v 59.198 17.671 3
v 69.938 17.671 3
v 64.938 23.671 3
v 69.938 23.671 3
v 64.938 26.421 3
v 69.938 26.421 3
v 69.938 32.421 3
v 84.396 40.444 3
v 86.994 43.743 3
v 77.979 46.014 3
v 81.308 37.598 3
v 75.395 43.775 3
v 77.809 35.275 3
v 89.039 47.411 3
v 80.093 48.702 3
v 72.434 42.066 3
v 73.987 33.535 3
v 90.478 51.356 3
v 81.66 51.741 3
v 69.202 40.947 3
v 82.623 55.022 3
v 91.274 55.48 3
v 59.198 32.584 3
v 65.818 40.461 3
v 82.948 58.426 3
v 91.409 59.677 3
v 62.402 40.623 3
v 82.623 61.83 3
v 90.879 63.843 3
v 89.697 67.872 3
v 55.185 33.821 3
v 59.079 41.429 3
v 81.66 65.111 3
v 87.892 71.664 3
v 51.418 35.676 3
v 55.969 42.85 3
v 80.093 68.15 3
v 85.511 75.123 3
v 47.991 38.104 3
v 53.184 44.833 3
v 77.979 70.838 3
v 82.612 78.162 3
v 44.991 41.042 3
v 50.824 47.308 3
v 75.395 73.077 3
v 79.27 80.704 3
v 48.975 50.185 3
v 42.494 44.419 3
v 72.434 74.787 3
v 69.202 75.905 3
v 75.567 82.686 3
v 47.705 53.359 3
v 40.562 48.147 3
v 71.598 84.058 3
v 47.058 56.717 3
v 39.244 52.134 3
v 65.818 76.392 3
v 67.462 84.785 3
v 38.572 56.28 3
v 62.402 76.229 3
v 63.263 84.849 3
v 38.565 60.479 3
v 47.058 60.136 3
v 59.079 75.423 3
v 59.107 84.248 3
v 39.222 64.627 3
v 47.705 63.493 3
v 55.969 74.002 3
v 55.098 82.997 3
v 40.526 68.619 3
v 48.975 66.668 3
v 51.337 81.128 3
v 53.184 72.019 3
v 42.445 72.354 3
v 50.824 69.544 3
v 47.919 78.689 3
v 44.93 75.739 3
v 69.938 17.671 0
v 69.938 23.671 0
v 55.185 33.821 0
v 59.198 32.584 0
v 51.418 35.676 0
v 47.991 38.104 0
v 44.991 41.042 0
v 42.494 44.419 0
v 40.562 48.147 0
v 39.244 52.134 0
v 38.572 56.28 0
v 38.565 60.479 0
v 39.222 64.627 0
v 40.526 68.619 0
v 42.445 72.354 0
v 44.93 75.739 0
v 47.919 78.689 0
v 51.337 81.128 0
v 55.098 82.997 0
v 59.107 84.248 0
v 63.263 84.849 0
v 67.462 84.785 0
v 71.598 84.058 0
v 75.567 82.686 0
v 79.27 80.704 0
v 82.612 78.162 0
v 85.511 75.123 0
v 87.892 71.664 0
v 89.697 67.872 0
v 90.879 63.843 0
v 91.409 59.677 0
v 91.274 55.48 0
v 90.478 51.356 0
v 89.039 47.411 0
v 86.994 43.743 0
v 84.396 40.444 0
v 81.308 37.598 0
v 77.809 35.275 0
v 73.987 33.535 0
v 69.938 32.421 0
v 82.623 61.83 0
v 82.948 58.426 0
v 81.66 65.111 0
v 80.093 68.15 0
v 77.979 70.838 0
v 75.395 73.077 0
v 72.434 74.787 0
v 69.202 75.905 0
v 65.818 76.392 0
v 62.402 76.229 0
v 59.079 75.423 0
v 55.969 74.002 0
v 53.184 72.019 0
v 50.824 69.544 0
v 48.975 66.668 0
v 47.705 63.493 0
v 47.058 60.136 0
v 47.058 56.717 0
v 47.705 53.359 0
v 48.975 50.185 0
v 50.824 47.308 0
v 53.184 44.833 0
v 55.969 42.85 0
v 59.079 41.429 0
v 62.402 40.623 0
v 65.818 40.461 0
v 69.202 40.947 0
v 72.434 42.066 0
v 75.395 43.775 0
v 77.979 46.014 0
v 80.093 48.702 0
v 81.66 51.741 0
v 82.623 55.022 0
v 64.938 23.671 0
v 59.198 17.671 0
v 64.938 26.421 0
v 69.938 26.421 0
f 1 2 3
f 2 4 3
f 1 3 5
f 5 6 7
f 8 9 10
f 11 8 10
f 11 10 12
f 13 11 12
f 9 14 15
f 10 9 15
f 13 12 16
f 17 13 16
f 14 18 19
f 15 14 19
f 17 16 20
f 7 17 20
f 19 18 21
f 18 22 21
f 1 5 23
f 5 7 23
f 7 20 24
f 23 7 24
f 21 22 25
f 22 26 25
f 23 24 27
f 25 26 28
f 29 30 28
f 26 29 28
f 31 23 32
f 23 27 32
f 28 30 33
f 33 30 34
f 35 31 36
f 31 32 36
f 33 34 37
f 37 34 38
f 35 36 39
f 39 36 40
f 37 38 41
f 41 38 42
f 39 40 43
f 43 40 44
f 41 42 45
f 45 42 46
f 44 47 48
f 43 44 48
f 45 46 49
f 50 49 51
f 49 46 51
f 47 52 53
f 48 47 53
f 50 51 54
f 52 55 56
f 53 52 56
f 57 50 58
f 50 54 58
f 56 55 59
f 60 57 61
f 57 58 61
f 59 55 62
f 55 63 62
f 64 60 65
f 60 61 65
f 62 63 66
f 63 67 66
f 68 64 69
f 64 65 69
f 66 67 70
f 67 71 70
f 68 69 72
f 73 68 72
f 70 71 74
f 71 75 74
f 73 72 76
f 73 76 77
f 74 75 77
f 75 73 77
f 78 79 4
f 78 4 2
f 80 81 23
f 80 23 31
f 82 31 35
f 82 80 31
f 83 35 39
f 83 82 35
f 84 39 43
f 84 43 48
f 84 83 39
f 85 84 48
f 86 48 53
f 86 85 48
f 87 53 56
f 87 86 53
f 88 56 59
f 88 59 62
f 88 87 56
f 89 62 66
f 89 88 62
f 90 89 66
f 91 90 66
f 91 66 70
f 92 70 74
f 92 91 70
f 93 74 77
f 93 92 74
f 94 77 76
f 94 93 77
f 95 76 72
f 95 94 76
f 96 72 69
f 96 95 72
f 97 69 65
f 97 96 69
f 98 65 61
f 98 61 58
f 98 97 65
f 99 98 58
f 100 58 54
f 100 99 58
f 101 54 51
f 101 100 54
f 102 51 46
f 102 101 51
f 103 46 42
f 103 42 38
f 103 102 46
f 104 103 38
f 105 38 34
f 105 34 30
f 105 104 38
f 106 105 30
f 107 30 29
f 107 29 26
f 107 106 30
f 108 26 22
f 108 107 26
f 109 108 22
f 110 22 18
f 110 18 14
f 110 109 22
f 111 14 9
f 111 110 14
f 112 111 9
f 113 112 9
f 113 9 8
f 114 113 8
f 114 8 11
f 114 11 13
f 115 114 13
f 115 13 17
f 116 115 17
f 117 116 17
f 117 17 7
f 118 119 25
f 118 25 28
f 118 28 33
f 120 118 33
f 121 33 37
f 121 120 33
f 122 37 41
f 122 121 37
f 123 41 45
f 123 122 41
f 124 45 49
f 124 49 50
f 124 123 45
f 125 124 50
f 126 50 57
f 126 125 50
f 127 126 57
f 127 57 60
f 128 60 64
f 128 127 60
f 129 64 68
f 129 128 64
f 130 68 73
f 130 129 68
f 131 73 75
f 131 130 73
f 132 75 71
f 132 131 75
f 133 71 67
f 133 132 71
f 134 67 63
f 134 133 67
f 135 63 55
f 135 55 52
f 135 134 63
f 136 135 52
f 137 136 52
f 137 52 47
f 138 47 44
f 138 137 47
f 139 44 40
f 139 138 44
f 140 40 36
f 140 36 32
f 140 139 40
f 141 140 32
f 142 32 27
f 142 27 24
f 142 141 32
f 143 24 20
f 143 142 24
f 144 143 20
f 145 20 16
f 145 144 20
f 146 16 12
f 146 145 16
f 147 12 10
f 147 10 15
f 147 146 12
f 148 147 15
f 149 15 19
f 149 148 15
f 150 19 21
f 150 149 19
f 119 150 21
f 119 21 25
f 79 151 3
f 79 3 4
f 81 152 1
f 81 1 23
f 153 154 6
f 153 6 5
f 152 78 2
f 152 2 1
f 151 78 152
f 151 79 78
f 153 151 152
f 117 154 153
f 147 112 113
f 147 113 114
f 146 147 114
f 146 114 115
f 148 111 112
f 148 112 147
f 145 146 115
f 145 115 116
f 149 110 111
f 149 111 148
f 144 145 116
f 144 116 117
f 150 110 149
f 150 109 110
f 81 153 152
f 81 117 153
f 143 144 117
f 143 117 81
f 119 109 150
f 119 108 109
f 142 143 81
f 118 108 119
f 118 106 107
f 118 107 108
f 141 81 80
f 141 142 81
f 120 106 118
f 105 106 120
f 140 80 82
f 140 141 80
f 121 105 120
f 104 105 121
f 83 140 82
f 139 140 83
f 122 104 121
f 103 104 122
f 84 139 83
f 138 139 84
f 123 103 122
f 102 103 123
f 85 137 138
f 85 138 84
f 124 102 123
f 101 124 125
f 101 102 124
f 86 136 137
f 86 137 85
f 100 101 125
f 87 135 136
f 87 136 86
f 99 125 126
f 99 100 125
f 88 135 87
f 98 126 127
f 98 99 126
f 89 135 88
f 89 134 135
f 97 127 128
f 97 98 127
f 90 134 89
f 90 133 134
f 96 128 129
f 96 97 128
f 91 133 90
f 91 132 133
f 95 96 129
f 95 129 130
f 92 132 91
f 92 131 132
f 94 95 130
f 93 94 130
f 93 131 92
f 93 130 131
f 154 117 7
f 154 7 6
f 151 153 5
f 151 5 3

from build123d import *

# Parameters (mm, degrees)
CROQUIS1_R              = 17.985951022
SALIENTE_EXTRUIR1_DEPTH = 3


with BuildPart() as part:
    # Croquis1 → Saliente-Extruir1 (new body)
    with BuildSketch(Plane.XY):
        with BuildLine():
            Line((69.938444675, 17.671179984), (59.198401062, 17.671179984))
            Line((59.198401062, 17.671179984), (59.198401062, 32.584255723))
            ThreePointArc((59.198401062, 32.584255723), (65.364018559, 84.900042365), (69.938444675, 32.421179984))
            Line((69.938444675, 32.421179984), (69.938444675, 26.421179984))
            Line((69.938444675, 26.421179984), (64.938444675, 26.421179984))
            Line((64.938444675, 26.421179984), (64.938444675, 23.671179984))
            Line((64.938444675, 23.671179984), (69.938444675, 23.671179984))
            Line((69.938444675, 23.671179984), (69.938444675, 17.671179984))
        make_face()
        with Locations((64.962042446, 58.426202565)):
            Circle(CROQUIS1_R, mode=Mode.SUBTRACT)
    extrude(amount=SALIENTE_EXTRUIR1_DEPTH)


solid = part.part
